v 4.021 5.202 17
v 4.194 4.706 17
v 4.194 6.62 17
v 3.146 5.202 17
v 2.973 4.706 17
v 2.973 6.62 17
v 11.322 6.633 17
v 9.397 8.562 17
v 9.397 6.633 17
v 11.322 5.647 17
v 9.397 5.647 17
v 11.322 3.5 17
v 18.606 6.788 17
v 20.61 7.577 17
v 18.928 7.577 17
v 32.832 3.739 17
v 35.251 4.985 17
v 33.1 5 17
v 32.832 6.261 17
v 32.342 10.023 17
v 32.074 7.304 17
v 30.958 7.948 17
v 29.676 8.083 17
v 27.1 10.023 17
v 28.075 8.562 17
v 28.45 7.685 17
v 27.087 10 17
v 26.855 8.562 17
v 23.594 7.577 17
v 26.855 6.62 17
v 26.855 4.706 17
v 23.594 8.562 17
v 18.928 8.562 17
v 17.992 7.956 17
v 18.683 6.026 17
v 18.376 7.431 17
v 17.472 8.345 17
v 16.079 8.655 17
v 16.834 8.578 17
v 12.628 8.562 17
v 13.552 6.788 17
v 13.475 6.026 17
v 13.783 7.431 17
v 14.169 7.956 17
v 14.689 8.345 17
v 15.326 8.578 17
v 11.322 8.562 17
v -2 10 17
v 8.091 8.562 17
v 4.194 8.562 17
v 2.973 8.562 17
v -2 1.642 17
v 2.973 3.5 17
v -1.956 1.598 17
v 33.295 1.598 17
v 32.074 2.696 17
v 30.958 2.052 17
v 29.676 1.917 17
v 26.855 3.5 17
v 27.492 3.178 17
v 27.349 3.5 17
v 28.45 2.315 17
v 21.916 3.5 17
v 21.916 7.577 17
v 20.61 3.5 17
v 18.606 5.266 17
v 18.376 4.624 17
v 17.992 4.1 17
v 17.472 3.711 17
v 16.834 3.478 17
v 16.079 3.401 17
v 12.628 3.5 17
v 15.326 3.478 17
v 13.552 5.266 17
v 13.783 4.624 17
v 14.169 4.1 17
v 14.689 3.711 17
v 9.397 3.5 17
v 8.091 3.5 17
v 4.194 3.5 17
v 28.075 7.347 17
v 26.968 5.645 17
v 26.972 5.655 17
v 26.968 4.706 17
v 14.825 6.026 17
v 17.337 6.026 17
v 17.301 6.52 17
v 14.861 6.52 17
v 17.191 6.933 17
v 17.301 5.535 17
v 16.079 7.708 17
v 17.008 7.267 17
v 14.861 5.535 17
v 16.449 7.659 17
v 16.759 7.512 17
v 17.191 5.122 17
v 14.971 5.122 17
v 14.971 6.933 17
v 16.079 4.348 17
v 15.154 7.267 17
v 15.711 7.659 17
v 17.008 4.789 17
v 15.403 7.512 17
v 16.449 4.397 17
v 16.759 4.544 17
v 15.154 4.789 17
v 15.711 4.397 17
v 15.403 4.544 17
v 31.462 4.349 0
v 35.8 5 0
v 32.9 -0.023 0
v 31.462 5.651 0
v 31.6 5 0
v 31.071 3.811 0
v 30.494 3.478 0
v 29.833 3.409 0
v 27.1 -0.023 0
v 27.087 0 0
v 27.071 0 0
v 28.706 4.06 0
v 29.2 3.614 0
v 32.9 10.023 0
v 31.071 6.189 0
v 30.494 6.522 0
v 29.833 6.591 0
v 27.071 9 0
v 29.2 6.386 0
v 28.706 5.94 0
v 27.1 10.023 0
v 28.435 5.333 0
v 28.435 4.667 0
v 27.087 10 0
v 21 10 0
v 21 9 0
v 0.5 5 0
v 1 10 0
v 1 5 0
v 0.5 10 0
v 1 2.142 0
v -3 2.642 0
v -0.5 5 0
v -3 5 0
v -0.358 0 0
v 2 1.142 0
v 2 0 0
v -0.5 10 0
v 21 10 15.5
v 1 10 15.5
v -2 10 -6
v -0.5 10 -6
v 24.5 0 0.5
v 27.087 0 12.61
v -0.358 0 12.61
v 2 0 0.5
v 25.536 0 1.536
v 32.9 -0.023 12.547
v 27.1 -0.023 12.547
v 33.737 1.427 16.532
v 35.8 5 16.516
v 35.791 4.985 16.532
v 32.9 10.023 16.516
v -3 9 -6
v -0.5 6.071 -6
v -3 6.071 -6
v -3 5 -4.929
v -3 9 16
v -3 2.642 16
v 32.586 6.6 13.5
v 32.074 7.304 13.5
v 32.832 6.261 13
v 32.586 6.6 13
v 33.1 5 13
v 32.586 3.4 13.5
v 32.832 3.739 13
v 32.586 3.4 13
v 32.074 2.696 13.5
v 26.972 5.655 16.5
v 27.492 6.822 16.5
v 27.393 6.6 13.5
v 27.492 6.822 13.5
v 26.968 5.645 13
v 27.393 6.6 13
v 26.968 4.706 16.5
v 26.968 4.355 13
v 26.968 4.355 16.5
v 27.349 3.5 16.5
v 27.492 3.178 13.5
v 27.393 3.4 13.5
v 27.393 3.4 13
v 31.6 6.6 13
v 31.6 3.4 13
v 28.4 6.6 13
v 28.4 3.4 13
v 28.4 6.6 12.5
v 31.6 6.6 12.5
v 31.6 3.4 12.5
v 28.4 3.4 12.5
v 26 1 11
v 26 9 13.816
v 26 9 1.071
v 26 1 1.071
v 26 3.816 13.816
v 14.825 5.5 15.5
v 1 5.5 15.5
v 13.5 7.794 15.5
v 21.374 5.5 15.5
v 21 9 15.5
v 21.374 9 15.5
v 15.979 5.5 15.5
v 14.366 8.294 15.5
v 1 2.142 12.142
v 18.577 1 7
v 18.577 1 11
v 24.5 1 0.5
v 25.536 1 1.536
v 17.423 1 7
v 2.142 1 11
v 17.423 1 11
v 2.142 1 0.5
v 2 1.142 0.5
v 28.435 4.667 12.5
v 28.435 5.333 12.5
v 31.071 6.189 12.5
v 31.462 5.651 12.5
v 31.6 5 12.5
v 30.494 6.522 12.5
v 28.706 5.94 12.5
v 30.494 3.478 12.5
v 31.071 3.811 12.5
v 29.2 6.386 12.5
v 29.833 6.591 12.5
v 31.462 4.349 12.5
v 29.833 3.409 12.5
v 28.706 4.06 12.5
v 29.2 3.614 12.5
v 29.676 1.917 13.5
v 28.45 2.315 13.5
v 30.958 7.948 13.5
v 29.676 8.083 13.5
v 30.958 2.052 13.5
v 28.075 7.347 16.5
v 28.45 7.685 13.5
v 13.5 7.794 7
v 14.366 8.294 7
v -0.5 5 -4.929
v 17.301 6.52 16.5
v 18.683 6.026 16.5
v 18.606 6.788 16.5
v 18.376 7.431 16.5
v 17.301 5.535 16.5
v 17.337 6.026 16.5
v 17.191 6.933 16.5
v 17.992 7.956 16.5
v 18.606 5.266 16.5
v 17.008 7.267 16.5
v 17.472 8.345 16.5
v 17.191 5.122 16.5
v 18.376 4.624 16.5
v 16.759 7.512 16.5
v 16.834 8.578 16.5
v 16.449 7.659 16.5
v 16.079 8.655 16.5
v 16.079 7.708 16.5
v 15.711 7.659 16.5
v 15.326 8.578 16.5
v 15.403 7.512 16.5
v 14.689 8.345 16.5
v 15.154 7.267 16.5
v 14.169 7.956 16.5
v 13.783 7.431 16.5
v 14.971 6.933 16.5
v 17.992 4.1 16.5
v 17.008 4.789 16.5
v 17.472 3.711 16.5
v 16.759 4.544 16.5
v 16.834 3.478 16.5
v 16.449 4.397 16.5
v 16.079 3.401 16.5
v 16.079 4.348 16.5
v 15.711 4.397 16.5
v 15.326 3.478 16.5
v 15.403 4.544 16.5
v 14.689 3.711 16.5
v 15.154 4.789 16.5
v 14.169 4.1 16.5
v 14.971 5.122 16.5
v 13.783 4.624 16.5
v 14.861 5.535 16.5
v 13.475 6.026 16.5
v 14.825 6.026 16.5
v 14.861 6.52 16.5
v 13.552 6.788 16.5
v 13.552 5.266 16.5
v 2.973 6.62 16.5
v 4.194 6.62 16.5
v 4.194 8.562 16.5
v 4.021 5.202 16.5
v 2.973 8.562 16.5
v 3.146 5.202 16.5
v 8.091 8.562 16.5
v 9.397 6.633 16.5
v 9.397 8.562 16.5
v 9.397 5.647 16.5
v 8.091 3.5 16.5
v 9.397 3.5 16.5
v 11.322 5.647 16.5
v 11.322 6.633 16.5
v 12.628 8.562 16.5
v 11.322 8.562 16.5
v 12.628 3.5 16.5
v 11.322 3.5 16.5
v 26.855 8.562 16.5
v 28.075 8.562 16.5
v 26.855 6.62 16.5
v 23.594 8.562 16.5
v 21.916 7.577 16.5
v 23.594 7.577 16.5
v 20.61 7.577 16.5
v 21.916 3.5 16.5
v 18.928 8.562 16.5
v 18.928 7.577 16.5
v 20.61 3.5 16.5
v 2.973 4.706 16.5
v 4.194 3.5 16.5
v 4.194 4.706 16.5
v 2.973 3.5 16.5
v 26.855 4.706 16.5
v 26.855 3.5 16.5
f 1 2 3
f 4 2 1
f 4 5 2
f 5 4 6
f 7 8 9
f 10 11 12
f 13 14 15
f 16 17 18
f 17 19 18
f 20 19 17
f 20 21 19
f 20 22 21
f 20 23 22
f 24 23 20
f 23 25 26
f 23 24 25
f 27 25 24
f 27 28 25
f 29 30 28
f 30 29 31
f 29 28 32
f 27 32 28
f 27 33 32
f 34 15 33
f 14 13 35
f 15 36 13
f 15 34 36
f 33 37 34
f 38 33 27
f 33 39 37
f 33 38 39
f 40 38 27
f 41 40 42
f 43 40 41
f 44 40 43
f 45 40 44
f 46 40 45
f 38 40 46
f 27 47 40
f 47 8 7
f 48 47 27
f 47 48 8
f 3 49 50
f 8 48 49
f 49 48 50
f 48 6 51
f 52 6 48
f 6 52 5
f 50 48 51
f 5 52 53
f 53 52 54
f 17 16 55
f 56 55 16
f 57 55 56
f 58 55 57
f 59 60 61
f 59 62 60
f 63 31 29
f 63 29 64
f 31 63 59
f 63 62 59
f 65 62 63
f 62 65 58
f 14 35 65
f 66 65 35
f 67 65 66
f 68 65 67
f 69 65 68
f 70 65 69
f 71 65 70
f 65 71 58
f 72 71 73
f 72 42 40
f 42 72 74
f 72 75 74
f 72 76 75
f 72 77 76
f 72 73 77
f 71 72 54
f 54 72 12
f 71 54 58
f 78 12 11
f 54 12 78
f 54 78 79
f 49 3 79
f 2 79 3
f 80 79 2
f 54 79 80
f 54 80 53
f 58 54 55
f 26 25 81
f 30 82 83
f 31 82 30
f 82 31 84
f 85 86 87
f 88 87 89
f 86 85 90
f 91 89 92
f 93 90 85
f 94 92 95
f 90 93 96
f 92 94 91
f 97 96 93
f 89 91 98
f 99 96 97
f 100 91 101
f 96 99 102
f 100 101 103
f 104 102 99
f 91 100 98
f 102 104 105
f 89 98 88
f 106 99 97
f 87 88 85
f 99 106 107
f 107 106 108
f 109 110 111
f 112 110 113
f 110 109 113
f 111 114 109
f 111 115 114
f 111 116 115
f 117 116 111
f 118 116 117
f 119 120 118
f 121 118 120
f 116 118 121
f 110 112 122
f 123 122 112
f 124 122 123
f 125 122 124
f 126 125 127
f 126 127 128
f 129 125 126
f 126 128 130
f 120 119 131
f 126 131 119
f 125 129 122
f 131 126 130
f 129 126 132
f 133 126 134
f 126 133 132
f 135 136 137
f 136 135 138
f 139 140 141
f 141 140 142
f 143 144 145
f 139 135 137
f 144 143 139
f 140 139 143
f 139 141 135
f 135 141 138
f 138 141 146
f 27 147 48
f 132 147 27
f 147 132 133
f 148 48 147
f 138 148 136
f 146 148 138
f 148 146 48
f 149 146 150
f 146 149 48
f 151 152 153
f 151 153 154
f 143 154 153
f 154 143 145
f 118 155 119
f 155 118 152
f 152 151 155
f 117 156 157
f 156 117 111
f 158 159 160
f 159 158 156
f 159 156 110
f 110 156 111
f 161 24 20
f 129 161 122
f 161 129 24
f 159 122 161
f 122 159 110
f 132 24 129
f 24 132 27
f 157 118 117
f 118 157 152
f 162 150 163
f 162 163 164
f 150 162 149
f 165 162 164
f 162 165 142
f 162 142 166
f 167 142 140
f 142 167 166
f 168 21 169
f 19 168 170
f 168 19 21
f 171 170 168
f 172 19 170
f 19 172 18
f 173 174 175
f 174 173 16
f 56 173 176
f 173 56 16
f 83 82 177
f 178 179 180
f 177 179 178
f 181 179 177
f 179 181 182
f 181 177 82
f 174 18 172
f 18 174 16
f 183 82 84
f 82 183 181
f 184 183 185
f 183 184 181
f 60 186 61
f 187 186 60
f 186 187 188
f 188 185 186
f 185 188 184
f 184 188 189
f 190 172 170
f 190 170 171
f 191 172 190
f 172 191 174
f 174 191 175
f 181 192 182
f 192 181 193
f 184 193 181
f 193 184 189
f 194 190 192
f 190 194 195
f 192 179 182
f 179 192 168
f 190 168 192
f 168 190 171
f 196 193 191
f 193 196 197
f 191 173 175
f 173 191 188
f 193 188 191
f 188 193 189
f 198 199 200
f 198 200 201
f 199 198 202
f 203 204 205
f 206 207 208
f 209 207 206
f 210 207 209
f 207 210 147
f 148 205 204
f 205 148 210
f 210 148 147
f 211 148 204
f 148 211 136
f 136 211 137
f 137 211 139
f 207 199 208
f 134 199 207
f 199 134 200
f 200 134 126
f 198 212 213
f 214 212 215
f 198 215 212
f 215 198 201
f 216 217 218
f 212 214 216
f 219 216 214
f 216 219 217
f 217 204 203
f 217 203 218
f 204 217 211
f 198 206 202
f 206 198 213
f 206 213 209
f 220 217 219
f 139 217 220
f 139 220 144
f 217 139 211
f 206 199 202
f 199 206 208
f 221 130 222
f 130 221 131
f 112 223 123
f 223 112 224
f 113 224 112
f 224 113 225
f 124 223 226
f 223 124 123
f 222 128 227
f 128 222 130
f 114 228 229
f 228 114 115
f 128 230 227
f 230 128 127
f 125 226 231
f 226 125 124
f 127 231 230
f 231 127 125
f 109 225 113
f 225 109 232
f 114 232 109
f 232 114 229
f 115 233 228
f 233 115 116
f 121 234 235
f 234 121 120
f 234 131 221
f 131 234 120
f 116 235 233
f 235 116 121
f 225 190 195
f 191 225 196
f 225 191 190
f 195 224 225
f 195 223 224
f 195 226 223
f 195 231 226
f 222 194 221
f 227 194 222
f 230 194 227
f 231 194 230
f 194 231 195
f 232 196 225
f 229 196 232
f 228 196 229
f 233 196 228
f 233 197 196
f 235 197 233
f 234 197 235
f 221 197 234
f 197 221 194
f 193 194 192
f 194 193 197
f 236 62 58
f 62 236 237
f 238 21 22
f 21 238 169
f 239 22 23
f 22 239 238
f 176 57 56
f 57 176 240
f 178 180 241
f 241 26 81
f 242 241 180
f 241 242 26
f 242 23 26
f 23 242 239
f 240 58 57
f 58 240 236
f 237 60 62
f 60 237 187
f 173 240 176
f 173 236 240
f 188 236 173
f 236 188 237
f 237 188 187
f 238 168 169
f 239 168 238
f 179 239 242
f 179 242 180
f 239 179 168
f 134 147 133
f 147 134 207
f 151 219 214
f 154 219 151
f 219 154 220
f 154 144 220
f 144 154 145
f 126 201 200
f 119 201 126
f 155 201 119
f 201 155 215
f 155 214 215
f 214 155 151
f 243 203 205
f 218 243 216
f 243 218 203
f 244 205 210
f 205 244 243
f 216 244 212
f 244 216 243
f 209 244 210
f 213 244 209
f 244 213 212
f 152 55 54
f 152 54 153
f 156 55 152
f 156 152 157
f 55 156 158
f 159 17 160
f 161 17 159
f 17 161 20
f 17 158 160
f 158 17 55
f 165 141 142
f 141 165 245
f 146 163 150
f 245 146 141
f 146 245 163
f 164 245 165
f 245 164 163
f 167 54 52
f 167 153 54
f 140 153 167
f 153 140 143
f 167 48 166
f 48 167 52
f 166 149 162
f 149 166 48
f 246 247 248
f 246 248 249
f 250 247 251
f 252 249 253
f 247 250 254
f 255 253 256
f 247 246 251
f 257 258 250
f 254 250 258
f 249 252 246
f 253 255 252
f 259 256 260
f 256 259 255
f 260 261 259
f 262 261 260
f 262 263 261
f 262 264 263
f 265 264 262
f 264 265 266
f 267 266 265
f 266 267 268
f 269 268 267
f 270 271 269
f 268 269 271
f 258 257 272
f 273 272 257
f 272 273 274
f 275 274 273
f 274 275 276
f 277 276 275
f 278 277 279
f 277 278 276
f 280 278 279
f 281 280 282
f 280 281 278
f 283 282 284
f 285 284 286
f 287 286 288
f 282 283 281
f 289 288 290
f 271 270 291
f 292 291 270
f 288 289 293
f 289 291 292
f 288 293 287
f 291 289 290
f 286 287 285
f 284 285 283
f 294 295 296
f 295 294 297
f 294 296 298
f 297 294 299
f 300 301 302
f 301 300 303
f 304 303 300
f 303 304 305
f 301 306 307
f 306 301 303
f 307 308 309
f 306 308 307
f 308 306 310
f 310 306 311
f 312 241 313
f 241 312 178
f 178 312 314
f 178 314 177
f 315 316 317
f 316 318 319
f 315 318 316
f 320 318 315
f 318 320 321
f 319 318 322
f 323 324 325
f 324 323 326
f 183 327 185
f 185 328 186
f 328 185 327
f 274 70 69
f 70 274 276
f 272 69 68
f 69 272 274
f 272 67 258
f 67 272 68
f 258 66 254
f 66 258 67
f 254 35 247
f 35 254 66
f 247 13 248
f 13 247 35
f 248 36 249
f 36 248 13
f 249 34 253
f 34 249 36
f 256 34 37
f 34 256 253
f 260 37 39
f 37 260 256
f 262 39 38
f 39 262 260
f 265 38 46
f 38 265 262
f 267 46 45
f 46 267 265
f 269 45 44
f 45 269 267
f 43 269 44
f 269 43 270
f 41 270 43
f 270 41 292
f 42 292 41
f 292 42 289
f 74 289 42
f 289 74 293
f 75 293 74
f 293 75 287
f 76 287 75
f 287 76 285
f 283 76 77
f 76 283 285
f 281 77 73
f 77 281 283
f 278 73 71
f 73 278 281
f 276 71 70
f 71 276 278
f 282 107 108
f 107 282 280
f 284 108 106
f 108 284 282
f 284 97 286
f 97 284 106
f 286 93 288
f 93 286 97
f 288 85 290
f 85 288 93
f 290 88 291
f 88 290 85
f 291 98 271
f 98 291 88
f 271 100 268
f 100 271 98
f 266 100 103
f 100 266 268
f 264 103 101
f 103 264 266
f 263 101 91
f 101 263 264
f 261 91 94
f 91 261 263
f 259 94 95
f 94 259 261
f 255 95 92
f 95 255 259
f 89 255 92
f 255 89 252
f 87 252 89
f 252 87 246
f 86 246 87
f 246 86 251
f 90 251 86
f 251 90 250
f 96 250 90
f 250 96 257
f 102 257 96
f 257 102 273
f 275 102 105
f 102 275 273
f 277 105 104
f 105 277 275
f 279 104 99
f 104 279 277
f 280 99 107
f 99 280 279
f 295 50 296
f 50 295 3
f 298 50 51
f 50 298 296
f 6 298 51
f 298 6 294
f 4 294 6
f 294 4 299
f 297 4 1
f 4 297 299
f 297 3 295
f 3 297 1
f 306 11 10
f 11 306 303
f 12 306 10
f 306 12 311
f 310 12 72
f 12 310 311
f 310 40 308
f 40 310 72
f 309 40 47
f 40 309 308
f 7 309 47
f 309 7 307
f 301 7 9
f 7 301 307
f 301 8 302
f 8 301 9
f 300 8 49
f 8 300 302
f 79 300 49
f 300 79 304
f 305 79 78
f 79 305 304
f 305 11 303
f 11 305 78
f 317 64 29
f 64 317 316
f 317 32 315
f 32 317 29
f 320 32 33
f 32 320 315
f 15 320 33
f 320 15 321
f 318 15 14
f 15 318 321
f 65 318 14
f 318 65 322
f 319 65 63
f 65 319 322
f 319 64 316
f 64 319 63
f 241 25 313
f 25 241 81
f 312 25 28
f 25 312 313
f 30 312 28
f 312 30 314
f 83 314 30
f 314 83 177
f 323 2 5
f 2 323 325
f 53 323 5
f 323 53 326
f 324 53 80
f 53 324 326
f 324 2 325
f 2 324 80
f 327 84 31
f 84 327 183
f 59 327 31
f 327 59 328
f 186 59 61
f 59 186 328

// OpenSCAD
// PRUSA iteration3
// Fan nozzle
// GNU GPL v3
// Josef Průša <iam@josefprusa.cz> and contributors
// http://www.reprap.org/wiki/Prusa_Mendel
// http://prusamendel.org

module fan_nozzle(){
    
difference(){    
union(){
cube([32,10,17]); // Main cube
translate([30,5,0])cylinder(r=5.8,h = 17, $fn=6);    
translate([-3,0,-6]) cube([3,10,23]);
}

// Mounting screw
translate([30,5,-10])cylinder(r=3.2/2,h = 24.5-0.2, $fn=15); // Screw cut
intersection(){
translate([30,5,9])cylinder(r=3.1,h = 25, $fn=15); // head cut
translate([30,5,17-3.5]) cube([6.2,3.2,1], center=true);
}
translate([30,5,17-4]) cube([3.2,3.2,1], center=true);
translate([30,5,17-3.5])cylinder(r=3.1,h = 20, $fn=15); // head cut

// Fan entry hole
translate([1,10-1.5,-1])cube([20,3,16.5]);
translate([1,10-1.5,-1-5])cube([18,3,16.5]);
    
// Airway cutout
difference(){    
translate([1,1,-1])cube([25,8,16.5]);    
translate([0,0,10])rotate([45,0,0])cube([30,8,16.5]);    
translate([-1,-10,-1])rotate([0,0,45])cube([10,8,30]); 
translate([20,0,16])rotate([0,20,0])cube([10,20,10]);    
}

translate([2,-1,-4.5])cube([24,3,5]);
translate([22,-1,-2])rotate([0,45,0])cube([5,10,5]);
    
}

// Air director
translate([18,0,7])rotate([0,0,30])cube([1,9,10]);


}

module fancy_corners(){
    
    translate([-10,-10.5,13])rotate([-20,0,0])cube([50,10,15]);
    translate([-16,-10.5,17.5])rotate([0,45,0])cube([10,30,15]);
    
    translate([46.5,-10.5,15])rotate([0,-45,30])cube([10,30,15]);
    translate([28.62,-10.5,15])rotate([0,-45,-30])cube([10,30,15]);

    translate([-5,-1,-7])rotate([0,0,0]) cube([10,6,7]);
    translate([-0.5,-1,-7])rotate([0,0,0]) cube([1,15,7]);
    translate([-5,4,-11])rotate([45,0,0]) cube([10,5,5]);

    //left cut
    translate([-6.5,-8,-5])rotate([0,0,45])cube([10,10,45]);
    translate([-7,-5,12])rotate([0,-45,0])cube([10,30,15]);
    
    translate([-7,5,-10])rotate([0,0,45])cube([10,10,35]);
    
    }

module fan_n(){
difference(){
fan_nozzle();
fancy_corners();    
translate([2,3.5,16.5])linear_extrude(height = 0.6) {text("! HOT !", size = 5, font = "Helvetica Neue:style=Bold");}
}
}
fan_n();
